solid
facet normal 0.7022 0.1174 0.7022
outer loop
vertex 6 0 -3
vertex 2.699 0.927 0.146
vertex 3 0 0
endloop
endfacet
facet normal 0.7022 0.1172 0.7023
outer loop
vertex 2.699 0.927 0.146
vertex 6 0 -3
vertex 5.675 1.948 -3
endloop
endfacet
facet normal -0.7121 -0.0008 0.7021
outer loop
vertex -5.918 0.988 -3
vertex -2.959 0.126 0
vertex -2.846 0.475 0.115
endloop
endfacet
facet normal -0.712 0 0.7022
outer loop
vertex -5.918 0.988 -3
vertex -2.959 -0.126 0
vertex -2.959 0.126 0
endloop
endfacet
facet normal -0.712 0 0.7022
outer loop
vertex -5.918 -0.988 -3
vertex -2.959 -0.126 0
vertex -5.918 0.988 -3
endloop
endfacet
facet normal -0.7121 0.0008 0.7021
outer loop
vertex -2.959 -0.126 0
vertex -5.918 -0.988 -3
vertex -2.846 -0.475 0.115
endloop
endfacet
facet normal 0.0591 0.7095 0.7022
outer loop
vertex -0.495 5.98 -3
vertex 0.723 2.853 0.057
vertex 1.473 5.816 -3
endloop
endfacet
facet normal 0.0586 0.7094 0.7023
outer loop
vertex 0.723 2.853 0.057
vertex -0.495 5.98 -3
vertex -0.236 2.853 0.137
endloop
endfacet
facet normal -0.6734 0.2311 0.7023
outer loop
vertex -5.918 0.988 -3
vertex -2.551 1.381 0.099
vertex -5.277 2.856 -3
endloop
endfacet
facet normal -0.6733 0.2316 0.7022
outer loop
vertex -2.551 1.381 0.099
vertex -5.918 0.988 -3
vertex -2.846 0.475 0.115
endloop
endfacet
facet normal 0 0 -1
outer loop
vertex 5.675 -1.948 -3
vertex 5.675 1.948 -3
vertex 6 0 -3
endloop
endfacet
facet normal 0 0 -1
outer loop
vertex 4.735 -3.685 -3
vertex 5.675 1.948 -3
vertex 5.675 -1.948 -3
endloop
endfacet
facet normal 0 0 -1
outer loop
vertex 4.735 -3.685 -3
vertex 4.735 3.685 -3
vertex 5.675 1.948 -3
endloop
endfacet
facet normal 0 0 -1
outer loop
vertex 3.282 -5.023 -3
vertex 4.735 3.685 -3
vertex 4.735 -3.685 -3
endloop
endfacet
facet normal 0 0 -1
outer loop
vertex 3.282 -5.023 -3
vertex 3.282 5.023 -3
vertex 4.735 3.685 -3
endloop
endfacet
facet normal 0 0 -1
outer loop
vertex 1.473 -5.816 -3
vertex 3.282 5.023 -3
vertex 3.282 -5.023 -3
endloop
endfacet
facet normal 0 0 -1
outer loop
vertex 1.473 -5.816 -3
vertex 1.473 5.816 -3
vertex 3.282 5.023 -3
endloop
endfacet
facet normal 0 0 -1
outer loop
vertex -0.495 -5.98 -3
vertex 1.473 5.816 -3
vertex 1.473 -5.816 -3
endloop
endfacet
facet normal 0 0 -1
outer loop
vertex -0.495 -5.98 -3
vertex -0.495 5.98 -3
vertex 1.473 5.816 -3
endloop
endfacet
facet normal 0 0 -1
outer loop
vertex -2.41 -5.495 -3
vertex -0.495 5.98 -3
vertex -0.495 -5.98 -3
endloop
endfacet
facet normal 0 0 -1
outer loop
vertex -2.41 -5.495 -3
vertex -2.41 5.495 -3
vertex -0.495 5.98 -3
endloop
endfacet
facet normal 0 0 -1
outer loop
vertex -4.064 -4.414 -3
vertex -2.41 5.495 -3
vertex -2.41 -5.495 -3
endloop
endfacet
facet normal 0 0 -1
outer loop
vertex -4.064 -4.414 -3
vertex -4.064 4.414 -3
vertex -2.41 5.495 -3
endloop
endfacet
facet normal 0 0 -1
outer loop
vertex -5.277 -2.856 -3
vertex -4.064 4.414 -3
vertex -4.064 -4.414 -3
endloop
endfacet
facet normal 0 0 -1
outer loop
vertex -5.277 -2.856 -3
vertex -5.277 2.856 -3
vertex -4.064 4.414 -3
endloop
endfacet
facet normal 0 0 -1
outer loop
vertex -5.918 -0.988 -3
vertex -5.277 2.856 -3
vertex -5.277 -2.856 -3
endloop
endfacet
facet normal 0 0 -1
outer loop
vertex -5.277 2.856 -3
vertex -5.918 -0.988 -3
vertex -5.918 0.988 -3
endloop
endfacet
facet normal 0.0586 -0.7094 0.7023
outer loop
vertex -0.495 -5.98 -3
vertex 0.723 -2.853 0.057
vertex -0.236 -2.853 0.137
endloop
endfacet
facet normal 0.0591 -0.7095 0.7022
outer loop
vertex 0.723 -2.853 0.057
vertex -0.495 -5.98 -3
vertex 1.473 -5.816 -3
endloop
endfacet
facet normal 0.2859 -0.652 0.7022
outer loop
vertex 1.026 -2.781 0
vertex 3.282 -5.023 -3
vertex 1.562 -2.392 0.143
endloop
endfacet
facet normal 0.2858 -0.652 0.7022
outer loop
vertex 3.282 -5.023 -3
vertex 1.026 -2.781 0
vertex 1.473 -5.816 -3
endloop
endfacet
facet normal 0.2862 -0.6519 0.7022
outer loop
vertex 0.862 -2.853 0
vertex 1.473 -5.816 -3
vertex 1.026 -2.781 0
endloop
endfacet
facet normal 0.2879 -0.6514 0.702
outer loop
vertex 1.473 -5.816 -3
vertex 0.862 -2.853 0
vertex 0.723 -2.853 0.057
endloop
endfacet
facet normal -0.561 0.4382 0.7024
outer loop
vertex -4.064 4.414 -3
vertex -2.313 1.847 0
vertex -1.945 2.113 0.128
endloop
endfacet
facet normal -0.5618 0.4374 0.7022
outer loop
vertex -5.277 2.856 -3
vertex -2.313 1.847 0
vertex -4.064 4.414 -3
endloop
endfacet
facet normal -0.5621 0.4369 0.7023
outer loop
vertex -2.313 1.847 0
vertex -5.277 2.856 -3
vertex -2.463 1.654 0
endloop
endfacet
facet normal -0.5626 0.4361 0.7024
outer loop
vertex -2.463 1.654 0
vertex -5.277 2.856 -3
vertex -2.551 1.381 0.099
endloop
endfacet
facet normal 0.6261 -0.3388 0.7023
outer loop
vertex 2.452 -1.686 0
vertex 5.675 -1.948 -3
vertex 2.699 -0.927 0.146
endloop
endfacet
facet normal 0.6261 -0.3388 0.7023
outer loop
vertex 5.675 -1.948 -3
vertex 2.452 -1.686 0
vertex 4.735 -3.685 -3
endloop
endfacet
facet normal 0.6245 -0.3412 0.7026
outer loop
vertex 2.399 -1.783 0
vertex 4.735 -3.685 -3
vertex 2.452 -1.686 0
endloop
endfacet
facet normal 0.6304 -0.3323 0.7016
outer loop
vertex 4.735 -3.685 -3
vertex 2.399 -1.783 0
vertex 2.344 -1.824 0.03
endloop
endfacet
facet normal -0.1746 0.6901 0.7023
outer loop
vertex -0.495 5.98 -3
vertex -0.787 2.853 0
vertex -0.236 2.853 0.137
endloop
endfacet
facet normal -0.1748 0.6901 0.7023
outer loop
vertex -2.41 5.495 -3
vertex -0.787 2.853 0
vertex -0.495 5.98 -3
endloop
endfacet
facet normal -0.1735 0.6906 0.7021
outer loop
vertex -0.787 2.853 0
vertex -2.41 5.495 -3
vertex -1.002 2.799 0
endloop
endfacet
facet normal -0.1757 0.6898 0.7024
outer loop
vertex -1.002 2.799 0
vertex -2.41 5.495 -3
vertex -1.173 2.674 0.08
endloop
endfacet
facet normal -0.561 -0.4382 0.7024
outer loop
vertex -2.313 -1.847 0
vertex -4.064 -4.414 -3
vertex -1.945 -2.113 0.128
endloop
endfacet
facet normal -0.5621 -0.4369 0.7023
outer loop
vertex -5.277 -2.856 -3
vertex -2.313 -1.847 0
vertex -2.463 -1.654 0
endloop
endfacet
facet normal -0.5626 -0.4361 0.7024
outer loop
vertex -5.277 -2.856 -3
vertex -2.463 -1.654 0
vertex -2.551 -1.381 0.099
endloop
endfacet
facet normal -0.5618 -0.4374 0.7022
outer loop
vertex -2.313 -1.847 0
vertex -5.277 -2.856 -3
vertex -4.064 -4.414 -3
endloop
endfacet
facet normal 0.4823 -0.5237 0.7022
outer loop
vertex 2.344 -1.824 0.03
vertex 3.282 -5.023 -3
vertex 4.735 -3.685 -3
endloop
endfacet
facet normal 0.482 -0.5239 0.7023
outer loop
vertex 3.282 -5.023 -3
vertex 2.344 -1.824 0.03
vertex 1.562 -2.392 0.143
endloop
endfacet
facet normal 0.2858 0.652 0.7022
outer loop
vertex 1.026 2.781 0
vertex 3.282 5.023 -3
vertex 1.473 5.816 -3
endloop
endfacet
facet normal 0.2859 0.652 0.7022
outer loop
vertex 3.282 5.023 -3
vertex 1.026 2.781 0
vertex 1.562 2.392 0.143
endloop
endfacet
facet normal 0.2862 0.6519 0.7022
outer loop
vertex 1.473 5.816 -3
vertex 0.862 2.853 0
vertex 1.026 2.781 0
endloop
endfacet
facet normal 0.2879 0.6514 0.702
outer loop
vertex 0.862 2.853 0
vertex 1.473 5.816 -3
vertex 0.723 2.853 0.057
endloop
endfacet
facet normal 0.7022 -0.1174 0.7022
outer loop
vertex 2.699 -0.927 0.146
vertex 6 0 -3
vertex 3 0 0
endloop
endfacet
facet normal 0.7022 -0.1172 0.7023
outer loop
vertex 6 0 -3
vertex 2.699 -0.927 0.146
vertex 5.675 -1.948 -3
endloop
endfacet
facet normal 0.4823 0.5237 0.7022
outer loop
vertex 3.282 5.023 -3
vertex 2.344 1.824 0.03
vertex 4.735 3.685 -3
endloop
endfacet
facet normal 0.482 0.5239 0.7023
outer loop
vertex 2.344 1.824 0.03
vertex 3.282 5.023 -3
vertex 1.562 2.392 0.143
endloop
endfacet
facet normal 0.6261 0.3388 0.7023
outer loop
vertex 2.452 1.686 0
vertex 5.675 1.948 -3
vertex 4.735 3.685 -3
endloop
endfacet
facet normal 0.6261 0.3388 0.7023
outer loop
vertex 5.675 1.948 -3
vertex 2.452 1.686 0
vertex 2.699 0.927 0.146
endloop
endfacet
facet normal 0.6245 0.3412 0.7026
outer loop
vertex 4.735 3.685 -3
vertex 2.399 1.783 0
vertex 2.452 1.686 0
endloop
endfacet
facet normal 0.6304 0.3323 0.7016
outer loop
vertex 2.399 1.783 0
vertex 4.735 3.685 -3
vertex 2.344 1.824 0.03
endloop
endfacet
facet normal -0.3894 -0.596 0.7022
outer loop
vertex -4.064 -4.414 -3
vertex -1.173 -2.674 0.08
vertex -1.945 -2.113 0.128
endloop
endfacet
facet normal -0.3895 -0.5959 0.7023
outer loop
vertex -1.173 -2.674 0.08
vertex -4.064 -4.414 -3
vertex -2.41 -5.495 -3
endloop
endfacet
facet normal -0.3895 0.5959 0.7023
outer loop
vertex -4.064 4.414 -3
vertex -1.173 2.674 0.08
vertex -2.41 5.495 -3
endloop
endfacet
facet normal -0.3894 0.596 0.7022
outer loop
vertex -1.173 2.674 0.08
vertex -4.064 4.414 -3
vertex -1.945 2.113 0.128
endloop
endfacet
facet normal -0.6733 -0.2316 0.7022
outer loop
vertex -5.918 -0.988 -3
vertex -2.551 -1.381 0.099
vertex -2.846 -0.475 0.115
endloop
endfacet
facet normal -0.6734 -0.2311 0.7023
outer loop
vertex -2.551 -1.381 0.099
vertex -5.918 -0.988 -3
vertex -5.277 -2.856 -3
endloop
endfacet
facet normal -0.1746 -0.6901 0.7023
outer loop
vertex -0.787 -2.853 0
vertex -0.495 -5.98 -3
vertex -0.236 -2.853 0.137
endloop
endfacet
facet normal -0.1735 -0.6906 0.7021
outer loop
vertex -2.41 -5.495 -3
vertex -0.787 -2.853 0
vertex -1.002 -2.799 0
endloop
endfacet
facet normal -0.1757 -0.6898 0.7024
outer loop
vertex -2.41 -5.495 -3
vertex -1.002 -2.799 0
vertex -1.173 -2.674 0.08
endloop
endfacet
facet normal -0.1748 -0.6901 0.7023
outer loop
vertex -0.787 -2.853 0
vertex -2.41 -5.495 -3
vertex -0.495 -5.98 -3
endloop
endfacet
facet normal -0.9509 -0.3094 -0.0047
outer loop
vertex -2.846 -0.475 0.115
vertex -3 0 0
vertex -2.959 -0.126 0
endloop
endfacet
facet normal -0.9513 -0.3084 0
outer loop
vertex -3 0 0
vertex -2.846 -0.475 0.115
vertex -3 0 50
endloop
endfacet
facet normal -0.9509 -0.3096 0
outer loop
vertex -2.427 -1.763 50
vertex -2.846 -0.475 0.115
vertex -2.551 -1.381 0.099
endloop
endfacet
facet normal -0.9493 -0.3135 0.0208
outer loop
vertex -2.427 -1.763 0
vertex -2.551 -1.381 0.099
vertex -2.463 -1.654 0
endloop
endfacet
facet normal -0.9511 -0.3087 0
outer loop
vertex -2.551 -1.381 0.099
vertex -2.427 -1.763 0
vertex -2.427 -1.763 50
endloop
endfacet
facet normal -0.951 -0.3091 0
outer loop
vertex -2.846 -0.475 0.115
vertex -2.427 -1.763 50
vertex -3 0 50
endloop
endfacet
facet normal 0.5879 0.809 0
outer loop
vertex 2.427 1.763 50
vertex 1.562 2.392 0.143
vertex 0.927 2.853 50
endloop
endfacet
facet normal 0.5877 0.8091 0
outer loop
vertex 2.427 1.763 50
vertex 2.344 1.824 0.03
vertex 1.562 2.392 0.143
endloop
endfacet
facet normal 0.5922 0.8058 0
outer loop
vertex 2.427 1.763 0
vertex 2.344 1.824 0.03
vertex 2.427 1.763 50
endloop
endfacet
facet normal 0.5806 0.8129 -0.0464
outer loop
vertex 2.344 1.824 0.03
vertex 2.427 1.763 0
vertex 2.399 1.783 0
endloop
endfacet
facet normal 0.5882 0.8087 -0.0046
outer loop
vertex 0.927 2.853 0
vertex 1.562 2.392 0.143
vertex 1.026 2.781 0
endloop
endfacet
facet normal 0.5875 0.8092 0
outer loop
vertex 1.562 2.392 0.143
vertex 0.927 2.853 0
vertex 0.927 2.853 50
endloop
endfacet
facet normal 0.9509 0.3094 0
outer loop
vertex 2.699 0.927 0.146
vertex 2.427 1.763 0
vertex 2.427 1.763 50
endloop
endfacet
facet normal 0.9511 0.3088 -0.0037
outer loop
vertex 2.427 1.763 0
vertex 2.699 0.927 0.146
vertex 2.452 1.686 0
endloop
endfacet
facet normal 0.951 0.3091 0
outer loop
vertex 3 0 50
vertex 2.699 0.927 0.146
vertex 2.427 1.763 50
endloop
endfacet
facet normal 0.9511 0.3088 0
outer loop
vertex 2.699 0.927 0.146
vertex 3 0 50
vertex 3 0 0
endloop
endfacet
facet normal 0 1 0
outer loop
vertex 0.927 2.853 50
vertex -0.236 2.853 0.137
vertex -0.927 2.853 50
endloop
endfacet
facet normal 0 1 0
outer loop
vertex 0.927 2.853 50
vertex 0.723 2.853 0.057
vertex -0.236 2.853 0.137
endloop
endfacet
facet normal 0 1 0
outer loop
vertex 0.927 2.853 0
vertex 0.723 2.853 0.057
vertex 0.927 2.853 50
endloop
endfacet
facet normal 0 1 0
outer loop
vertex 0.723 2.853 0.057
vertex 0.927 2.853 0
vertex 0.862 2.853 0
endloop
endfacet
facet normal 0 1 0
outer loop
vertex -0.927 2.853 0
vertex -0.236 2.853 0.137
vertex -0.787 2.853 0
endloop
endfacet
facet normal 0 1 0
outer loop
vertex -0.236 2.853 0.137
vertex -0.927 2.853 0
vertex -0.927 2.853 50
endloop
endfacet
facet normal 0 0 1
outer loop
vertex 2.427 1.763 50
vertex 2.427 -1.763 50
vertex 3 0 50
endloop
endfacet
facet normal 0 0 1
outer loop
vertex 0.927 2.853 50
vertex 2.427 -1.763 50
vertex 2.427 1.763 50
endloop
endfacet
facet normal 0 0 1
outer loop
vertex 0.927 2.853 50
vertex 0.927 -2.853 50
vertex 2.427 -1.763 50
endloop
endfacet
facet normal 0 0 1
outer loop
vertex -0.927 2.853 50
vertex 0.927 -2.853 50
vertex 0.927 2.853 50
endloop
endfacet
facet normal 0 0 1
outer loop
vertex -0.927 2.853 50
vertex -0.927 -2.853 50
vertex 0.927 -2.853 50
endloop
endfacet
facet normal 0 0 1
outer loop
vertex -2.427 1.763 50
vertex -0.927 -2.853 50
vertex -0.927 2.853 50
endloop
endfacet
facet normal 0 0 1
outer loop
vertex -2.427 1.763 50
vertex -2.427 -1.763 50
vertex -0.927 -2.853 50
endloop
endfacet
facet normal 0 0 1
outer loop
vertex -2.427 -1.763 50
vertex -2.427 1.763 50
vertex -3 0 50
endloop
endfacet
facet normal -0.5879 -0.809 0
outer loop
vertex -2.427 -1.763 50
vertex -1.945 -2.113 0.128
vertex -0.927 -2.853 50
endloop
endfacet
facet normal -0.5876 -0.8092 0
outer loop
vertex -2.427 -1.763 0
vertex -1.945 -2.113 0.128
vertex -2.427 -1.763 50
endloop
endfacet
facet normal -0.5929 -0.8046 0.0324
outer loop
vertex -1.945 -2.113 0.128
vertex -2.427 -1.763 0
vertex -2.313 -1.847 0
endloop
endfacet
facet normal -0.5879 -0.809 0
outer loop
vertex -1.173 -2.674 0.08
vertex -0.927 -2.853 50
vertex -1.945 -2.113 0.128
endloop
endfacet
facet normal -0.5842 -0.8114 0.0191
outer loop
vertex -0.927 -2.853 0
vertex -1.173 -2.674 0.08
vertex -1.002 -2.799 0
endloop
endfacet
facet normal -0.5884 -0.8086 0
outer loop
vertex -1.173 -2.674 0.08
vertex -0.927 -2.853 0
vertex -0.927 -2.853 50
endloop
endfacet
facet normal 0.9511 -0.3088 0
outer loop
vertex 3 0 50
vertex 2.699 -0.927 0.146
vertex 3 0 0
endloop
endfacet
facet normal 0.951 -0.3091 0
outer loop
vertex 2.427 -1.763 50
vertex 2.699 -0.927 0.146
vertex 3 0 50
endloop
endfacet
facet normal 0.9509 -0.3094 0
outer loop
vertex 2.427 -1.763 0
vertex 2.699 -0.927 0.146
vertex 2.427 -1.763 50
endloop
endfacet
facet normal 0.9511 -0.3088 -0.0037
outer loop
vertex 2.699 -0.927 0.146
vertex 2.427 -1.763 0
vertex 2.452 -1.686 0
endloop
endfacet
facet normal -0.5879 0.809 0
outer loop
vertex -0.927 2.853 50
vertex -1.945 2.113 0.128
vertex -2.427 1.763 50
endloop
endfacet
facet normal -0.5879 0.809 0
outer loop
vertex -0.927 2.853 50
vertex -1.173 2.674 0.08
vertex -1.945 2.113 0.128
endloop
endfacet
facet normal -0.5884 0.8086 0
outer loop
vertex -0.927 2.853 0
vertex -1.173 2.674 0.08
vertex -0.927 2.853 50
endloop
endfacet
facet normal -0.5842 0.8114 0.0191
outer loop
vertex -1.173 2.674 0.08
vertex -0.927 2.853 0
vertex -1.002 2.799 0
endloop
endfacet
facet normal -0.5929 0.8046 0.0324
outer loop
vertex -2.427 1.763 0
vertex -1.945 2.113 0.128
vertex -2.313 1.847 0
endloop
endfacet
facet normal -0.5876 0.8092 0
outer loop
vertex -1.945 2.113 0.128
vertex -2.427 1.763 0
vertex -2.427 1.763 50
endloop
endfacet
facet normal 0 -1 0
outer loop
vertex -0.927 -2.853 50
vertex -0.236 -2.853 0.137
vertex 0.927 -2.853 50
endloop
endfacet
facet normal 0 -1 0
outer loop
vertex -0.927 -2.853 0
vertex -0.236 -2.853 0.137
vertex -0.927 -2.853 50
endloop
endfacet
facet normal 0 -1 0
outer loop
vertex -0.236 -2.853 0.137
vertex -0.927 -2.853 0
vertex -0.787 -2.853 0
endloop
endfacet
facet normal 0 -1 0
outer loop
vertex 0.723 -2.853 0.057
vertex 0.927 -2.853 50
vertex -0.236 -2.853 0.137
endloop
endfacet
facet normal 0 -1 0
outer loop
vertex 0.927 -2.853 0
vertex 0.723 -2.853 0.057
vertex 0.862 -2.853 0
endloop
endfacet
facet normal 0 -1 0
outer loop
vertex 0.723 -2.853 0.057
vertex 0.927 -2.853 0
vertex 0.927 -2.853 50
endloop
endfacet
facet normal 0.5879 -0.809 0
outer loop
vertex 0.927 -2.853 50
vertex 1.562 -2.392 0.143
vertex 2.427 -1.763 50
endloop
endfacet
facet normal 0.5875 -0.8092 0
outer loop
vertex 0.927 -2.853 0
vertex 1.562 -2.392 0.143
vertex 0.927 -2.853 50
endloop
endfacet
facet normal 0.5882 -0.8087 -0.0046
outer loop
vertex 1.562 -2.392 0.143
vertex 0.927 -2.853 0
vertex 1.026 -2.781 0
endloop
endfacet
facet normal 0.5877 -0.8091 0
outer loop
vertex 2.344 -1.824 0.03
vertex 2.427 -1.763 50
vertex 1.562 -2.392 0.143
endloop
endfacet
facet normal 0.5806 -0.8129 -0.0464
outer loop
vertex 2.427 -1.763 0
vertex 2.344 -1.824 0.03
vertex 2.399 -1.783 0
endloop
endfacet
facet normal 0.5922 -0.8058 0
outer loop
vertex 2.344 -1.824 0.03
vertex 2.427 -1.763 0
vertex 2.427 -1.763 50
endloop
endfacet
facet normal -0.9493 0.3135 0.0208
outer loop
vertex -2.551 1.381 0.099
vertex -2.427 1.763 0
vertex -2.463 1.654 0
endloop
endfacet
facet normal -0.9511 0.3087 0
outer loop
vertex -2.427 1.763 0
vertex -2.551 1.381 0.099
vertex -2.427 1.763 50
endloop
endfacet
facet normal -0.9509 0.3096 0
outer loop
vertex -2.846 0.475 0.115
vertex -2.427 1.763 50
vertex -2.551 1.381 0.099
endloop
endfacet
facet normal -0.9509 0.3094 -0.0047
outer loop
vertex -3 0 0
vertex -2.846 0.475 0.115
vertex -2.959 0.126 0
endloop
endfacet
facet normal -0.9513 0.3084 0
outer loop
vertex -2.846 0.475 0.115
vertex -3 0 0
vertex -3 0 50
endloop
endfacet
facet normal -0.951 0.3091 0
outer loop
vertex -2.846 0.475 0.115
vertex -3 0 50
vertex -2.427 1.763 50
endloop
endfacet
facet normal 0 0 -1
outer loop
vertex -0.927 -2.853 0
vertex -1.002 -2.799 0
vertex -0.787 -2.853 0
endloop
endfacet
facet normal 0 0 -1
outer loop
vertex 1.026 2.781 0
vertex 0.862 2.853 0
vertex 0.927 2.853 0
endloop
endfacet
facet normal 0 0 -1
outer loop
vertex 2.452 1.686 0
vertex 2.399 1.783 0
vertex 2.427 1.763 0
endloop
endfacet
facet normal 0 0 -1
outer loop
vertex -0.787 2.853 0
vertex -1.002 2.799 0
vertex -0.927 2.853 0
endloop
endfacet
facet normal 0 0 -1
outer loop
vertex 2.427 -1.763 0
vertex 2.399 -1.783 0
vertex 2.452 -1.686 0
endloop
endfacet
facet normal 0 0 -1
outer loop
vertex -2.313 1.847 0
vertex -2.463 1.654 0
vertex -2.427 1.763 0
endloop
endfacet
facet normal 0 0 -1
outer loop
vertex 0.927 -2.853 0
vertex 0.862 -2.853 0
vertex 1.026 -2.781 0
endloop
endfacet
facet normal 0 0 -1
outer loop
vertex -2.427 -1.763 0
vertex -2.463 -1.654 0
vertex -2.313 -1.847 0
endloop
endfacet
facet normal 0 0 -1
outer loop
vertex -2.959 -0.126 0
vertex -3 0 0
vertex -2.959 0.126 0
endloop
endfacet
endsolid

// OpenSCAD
// file: common.scad
//
// Common
//

// Define part overlap.
cmn_OVERLAP = 0.001;
// file: schnecke.scad
//
// raimund-the-juicer
//
// schnecke part
//
// Copyright (c) 2020 Michael Binz
//

use <lib/spiral.scad>

/**
 *
 */
module schnecke( 
    h=100,
    r1=50,
    r2=20,
    resolution=50 )
{
    union()
    {
        stomp( 
            h=h, 
            stompHeight=5,
            r1=21,
            r2=10 );
        
        difference()
        {
            cylinder( r1=r1, r2=r2, h=h );

            translate( [0,0,h/2])
            spiralSimple(
                height=h,
                Radius=30,
                baseRadius=20,
                frequency=4,
                resolution=50
            );
        }
    }
}

/**
 * A cylinder stomp.  Creates a cylinder and limits this to
 * stompHeight.
 */
module stomp( h, stompHeight, r1, r2 )
{
    d = max( r1, r2 ) * 2;
    
    difference()
    {
        cylinder( r1=r1, r2=r2, h=h );
        
        translate( [0,0,(h/2)+stompHeight] )
            cube( [d,d,h], center = true  );
    }
}
// main file
//
// raimund-the-juicer
//
// welle top-level part
//
// Copyright (c) 2020 Michael Binz
//

use <schnecke.scad>
use <lib/threads.scad>
use <common.scad>

drilling();

module drilling()
{
    diameter = 6;
    depth = 50;
    
    union ()
    {
        
    cylinder(
        h=diameter, 
        d1=2*diameter,
        d2=0,
        center=true);
    
    translate( [0, 0, depth/2] )
    {
        cylinder(
            h=depth, 
            d=diameter,
            center=true);
    }
    
    } // union
}
